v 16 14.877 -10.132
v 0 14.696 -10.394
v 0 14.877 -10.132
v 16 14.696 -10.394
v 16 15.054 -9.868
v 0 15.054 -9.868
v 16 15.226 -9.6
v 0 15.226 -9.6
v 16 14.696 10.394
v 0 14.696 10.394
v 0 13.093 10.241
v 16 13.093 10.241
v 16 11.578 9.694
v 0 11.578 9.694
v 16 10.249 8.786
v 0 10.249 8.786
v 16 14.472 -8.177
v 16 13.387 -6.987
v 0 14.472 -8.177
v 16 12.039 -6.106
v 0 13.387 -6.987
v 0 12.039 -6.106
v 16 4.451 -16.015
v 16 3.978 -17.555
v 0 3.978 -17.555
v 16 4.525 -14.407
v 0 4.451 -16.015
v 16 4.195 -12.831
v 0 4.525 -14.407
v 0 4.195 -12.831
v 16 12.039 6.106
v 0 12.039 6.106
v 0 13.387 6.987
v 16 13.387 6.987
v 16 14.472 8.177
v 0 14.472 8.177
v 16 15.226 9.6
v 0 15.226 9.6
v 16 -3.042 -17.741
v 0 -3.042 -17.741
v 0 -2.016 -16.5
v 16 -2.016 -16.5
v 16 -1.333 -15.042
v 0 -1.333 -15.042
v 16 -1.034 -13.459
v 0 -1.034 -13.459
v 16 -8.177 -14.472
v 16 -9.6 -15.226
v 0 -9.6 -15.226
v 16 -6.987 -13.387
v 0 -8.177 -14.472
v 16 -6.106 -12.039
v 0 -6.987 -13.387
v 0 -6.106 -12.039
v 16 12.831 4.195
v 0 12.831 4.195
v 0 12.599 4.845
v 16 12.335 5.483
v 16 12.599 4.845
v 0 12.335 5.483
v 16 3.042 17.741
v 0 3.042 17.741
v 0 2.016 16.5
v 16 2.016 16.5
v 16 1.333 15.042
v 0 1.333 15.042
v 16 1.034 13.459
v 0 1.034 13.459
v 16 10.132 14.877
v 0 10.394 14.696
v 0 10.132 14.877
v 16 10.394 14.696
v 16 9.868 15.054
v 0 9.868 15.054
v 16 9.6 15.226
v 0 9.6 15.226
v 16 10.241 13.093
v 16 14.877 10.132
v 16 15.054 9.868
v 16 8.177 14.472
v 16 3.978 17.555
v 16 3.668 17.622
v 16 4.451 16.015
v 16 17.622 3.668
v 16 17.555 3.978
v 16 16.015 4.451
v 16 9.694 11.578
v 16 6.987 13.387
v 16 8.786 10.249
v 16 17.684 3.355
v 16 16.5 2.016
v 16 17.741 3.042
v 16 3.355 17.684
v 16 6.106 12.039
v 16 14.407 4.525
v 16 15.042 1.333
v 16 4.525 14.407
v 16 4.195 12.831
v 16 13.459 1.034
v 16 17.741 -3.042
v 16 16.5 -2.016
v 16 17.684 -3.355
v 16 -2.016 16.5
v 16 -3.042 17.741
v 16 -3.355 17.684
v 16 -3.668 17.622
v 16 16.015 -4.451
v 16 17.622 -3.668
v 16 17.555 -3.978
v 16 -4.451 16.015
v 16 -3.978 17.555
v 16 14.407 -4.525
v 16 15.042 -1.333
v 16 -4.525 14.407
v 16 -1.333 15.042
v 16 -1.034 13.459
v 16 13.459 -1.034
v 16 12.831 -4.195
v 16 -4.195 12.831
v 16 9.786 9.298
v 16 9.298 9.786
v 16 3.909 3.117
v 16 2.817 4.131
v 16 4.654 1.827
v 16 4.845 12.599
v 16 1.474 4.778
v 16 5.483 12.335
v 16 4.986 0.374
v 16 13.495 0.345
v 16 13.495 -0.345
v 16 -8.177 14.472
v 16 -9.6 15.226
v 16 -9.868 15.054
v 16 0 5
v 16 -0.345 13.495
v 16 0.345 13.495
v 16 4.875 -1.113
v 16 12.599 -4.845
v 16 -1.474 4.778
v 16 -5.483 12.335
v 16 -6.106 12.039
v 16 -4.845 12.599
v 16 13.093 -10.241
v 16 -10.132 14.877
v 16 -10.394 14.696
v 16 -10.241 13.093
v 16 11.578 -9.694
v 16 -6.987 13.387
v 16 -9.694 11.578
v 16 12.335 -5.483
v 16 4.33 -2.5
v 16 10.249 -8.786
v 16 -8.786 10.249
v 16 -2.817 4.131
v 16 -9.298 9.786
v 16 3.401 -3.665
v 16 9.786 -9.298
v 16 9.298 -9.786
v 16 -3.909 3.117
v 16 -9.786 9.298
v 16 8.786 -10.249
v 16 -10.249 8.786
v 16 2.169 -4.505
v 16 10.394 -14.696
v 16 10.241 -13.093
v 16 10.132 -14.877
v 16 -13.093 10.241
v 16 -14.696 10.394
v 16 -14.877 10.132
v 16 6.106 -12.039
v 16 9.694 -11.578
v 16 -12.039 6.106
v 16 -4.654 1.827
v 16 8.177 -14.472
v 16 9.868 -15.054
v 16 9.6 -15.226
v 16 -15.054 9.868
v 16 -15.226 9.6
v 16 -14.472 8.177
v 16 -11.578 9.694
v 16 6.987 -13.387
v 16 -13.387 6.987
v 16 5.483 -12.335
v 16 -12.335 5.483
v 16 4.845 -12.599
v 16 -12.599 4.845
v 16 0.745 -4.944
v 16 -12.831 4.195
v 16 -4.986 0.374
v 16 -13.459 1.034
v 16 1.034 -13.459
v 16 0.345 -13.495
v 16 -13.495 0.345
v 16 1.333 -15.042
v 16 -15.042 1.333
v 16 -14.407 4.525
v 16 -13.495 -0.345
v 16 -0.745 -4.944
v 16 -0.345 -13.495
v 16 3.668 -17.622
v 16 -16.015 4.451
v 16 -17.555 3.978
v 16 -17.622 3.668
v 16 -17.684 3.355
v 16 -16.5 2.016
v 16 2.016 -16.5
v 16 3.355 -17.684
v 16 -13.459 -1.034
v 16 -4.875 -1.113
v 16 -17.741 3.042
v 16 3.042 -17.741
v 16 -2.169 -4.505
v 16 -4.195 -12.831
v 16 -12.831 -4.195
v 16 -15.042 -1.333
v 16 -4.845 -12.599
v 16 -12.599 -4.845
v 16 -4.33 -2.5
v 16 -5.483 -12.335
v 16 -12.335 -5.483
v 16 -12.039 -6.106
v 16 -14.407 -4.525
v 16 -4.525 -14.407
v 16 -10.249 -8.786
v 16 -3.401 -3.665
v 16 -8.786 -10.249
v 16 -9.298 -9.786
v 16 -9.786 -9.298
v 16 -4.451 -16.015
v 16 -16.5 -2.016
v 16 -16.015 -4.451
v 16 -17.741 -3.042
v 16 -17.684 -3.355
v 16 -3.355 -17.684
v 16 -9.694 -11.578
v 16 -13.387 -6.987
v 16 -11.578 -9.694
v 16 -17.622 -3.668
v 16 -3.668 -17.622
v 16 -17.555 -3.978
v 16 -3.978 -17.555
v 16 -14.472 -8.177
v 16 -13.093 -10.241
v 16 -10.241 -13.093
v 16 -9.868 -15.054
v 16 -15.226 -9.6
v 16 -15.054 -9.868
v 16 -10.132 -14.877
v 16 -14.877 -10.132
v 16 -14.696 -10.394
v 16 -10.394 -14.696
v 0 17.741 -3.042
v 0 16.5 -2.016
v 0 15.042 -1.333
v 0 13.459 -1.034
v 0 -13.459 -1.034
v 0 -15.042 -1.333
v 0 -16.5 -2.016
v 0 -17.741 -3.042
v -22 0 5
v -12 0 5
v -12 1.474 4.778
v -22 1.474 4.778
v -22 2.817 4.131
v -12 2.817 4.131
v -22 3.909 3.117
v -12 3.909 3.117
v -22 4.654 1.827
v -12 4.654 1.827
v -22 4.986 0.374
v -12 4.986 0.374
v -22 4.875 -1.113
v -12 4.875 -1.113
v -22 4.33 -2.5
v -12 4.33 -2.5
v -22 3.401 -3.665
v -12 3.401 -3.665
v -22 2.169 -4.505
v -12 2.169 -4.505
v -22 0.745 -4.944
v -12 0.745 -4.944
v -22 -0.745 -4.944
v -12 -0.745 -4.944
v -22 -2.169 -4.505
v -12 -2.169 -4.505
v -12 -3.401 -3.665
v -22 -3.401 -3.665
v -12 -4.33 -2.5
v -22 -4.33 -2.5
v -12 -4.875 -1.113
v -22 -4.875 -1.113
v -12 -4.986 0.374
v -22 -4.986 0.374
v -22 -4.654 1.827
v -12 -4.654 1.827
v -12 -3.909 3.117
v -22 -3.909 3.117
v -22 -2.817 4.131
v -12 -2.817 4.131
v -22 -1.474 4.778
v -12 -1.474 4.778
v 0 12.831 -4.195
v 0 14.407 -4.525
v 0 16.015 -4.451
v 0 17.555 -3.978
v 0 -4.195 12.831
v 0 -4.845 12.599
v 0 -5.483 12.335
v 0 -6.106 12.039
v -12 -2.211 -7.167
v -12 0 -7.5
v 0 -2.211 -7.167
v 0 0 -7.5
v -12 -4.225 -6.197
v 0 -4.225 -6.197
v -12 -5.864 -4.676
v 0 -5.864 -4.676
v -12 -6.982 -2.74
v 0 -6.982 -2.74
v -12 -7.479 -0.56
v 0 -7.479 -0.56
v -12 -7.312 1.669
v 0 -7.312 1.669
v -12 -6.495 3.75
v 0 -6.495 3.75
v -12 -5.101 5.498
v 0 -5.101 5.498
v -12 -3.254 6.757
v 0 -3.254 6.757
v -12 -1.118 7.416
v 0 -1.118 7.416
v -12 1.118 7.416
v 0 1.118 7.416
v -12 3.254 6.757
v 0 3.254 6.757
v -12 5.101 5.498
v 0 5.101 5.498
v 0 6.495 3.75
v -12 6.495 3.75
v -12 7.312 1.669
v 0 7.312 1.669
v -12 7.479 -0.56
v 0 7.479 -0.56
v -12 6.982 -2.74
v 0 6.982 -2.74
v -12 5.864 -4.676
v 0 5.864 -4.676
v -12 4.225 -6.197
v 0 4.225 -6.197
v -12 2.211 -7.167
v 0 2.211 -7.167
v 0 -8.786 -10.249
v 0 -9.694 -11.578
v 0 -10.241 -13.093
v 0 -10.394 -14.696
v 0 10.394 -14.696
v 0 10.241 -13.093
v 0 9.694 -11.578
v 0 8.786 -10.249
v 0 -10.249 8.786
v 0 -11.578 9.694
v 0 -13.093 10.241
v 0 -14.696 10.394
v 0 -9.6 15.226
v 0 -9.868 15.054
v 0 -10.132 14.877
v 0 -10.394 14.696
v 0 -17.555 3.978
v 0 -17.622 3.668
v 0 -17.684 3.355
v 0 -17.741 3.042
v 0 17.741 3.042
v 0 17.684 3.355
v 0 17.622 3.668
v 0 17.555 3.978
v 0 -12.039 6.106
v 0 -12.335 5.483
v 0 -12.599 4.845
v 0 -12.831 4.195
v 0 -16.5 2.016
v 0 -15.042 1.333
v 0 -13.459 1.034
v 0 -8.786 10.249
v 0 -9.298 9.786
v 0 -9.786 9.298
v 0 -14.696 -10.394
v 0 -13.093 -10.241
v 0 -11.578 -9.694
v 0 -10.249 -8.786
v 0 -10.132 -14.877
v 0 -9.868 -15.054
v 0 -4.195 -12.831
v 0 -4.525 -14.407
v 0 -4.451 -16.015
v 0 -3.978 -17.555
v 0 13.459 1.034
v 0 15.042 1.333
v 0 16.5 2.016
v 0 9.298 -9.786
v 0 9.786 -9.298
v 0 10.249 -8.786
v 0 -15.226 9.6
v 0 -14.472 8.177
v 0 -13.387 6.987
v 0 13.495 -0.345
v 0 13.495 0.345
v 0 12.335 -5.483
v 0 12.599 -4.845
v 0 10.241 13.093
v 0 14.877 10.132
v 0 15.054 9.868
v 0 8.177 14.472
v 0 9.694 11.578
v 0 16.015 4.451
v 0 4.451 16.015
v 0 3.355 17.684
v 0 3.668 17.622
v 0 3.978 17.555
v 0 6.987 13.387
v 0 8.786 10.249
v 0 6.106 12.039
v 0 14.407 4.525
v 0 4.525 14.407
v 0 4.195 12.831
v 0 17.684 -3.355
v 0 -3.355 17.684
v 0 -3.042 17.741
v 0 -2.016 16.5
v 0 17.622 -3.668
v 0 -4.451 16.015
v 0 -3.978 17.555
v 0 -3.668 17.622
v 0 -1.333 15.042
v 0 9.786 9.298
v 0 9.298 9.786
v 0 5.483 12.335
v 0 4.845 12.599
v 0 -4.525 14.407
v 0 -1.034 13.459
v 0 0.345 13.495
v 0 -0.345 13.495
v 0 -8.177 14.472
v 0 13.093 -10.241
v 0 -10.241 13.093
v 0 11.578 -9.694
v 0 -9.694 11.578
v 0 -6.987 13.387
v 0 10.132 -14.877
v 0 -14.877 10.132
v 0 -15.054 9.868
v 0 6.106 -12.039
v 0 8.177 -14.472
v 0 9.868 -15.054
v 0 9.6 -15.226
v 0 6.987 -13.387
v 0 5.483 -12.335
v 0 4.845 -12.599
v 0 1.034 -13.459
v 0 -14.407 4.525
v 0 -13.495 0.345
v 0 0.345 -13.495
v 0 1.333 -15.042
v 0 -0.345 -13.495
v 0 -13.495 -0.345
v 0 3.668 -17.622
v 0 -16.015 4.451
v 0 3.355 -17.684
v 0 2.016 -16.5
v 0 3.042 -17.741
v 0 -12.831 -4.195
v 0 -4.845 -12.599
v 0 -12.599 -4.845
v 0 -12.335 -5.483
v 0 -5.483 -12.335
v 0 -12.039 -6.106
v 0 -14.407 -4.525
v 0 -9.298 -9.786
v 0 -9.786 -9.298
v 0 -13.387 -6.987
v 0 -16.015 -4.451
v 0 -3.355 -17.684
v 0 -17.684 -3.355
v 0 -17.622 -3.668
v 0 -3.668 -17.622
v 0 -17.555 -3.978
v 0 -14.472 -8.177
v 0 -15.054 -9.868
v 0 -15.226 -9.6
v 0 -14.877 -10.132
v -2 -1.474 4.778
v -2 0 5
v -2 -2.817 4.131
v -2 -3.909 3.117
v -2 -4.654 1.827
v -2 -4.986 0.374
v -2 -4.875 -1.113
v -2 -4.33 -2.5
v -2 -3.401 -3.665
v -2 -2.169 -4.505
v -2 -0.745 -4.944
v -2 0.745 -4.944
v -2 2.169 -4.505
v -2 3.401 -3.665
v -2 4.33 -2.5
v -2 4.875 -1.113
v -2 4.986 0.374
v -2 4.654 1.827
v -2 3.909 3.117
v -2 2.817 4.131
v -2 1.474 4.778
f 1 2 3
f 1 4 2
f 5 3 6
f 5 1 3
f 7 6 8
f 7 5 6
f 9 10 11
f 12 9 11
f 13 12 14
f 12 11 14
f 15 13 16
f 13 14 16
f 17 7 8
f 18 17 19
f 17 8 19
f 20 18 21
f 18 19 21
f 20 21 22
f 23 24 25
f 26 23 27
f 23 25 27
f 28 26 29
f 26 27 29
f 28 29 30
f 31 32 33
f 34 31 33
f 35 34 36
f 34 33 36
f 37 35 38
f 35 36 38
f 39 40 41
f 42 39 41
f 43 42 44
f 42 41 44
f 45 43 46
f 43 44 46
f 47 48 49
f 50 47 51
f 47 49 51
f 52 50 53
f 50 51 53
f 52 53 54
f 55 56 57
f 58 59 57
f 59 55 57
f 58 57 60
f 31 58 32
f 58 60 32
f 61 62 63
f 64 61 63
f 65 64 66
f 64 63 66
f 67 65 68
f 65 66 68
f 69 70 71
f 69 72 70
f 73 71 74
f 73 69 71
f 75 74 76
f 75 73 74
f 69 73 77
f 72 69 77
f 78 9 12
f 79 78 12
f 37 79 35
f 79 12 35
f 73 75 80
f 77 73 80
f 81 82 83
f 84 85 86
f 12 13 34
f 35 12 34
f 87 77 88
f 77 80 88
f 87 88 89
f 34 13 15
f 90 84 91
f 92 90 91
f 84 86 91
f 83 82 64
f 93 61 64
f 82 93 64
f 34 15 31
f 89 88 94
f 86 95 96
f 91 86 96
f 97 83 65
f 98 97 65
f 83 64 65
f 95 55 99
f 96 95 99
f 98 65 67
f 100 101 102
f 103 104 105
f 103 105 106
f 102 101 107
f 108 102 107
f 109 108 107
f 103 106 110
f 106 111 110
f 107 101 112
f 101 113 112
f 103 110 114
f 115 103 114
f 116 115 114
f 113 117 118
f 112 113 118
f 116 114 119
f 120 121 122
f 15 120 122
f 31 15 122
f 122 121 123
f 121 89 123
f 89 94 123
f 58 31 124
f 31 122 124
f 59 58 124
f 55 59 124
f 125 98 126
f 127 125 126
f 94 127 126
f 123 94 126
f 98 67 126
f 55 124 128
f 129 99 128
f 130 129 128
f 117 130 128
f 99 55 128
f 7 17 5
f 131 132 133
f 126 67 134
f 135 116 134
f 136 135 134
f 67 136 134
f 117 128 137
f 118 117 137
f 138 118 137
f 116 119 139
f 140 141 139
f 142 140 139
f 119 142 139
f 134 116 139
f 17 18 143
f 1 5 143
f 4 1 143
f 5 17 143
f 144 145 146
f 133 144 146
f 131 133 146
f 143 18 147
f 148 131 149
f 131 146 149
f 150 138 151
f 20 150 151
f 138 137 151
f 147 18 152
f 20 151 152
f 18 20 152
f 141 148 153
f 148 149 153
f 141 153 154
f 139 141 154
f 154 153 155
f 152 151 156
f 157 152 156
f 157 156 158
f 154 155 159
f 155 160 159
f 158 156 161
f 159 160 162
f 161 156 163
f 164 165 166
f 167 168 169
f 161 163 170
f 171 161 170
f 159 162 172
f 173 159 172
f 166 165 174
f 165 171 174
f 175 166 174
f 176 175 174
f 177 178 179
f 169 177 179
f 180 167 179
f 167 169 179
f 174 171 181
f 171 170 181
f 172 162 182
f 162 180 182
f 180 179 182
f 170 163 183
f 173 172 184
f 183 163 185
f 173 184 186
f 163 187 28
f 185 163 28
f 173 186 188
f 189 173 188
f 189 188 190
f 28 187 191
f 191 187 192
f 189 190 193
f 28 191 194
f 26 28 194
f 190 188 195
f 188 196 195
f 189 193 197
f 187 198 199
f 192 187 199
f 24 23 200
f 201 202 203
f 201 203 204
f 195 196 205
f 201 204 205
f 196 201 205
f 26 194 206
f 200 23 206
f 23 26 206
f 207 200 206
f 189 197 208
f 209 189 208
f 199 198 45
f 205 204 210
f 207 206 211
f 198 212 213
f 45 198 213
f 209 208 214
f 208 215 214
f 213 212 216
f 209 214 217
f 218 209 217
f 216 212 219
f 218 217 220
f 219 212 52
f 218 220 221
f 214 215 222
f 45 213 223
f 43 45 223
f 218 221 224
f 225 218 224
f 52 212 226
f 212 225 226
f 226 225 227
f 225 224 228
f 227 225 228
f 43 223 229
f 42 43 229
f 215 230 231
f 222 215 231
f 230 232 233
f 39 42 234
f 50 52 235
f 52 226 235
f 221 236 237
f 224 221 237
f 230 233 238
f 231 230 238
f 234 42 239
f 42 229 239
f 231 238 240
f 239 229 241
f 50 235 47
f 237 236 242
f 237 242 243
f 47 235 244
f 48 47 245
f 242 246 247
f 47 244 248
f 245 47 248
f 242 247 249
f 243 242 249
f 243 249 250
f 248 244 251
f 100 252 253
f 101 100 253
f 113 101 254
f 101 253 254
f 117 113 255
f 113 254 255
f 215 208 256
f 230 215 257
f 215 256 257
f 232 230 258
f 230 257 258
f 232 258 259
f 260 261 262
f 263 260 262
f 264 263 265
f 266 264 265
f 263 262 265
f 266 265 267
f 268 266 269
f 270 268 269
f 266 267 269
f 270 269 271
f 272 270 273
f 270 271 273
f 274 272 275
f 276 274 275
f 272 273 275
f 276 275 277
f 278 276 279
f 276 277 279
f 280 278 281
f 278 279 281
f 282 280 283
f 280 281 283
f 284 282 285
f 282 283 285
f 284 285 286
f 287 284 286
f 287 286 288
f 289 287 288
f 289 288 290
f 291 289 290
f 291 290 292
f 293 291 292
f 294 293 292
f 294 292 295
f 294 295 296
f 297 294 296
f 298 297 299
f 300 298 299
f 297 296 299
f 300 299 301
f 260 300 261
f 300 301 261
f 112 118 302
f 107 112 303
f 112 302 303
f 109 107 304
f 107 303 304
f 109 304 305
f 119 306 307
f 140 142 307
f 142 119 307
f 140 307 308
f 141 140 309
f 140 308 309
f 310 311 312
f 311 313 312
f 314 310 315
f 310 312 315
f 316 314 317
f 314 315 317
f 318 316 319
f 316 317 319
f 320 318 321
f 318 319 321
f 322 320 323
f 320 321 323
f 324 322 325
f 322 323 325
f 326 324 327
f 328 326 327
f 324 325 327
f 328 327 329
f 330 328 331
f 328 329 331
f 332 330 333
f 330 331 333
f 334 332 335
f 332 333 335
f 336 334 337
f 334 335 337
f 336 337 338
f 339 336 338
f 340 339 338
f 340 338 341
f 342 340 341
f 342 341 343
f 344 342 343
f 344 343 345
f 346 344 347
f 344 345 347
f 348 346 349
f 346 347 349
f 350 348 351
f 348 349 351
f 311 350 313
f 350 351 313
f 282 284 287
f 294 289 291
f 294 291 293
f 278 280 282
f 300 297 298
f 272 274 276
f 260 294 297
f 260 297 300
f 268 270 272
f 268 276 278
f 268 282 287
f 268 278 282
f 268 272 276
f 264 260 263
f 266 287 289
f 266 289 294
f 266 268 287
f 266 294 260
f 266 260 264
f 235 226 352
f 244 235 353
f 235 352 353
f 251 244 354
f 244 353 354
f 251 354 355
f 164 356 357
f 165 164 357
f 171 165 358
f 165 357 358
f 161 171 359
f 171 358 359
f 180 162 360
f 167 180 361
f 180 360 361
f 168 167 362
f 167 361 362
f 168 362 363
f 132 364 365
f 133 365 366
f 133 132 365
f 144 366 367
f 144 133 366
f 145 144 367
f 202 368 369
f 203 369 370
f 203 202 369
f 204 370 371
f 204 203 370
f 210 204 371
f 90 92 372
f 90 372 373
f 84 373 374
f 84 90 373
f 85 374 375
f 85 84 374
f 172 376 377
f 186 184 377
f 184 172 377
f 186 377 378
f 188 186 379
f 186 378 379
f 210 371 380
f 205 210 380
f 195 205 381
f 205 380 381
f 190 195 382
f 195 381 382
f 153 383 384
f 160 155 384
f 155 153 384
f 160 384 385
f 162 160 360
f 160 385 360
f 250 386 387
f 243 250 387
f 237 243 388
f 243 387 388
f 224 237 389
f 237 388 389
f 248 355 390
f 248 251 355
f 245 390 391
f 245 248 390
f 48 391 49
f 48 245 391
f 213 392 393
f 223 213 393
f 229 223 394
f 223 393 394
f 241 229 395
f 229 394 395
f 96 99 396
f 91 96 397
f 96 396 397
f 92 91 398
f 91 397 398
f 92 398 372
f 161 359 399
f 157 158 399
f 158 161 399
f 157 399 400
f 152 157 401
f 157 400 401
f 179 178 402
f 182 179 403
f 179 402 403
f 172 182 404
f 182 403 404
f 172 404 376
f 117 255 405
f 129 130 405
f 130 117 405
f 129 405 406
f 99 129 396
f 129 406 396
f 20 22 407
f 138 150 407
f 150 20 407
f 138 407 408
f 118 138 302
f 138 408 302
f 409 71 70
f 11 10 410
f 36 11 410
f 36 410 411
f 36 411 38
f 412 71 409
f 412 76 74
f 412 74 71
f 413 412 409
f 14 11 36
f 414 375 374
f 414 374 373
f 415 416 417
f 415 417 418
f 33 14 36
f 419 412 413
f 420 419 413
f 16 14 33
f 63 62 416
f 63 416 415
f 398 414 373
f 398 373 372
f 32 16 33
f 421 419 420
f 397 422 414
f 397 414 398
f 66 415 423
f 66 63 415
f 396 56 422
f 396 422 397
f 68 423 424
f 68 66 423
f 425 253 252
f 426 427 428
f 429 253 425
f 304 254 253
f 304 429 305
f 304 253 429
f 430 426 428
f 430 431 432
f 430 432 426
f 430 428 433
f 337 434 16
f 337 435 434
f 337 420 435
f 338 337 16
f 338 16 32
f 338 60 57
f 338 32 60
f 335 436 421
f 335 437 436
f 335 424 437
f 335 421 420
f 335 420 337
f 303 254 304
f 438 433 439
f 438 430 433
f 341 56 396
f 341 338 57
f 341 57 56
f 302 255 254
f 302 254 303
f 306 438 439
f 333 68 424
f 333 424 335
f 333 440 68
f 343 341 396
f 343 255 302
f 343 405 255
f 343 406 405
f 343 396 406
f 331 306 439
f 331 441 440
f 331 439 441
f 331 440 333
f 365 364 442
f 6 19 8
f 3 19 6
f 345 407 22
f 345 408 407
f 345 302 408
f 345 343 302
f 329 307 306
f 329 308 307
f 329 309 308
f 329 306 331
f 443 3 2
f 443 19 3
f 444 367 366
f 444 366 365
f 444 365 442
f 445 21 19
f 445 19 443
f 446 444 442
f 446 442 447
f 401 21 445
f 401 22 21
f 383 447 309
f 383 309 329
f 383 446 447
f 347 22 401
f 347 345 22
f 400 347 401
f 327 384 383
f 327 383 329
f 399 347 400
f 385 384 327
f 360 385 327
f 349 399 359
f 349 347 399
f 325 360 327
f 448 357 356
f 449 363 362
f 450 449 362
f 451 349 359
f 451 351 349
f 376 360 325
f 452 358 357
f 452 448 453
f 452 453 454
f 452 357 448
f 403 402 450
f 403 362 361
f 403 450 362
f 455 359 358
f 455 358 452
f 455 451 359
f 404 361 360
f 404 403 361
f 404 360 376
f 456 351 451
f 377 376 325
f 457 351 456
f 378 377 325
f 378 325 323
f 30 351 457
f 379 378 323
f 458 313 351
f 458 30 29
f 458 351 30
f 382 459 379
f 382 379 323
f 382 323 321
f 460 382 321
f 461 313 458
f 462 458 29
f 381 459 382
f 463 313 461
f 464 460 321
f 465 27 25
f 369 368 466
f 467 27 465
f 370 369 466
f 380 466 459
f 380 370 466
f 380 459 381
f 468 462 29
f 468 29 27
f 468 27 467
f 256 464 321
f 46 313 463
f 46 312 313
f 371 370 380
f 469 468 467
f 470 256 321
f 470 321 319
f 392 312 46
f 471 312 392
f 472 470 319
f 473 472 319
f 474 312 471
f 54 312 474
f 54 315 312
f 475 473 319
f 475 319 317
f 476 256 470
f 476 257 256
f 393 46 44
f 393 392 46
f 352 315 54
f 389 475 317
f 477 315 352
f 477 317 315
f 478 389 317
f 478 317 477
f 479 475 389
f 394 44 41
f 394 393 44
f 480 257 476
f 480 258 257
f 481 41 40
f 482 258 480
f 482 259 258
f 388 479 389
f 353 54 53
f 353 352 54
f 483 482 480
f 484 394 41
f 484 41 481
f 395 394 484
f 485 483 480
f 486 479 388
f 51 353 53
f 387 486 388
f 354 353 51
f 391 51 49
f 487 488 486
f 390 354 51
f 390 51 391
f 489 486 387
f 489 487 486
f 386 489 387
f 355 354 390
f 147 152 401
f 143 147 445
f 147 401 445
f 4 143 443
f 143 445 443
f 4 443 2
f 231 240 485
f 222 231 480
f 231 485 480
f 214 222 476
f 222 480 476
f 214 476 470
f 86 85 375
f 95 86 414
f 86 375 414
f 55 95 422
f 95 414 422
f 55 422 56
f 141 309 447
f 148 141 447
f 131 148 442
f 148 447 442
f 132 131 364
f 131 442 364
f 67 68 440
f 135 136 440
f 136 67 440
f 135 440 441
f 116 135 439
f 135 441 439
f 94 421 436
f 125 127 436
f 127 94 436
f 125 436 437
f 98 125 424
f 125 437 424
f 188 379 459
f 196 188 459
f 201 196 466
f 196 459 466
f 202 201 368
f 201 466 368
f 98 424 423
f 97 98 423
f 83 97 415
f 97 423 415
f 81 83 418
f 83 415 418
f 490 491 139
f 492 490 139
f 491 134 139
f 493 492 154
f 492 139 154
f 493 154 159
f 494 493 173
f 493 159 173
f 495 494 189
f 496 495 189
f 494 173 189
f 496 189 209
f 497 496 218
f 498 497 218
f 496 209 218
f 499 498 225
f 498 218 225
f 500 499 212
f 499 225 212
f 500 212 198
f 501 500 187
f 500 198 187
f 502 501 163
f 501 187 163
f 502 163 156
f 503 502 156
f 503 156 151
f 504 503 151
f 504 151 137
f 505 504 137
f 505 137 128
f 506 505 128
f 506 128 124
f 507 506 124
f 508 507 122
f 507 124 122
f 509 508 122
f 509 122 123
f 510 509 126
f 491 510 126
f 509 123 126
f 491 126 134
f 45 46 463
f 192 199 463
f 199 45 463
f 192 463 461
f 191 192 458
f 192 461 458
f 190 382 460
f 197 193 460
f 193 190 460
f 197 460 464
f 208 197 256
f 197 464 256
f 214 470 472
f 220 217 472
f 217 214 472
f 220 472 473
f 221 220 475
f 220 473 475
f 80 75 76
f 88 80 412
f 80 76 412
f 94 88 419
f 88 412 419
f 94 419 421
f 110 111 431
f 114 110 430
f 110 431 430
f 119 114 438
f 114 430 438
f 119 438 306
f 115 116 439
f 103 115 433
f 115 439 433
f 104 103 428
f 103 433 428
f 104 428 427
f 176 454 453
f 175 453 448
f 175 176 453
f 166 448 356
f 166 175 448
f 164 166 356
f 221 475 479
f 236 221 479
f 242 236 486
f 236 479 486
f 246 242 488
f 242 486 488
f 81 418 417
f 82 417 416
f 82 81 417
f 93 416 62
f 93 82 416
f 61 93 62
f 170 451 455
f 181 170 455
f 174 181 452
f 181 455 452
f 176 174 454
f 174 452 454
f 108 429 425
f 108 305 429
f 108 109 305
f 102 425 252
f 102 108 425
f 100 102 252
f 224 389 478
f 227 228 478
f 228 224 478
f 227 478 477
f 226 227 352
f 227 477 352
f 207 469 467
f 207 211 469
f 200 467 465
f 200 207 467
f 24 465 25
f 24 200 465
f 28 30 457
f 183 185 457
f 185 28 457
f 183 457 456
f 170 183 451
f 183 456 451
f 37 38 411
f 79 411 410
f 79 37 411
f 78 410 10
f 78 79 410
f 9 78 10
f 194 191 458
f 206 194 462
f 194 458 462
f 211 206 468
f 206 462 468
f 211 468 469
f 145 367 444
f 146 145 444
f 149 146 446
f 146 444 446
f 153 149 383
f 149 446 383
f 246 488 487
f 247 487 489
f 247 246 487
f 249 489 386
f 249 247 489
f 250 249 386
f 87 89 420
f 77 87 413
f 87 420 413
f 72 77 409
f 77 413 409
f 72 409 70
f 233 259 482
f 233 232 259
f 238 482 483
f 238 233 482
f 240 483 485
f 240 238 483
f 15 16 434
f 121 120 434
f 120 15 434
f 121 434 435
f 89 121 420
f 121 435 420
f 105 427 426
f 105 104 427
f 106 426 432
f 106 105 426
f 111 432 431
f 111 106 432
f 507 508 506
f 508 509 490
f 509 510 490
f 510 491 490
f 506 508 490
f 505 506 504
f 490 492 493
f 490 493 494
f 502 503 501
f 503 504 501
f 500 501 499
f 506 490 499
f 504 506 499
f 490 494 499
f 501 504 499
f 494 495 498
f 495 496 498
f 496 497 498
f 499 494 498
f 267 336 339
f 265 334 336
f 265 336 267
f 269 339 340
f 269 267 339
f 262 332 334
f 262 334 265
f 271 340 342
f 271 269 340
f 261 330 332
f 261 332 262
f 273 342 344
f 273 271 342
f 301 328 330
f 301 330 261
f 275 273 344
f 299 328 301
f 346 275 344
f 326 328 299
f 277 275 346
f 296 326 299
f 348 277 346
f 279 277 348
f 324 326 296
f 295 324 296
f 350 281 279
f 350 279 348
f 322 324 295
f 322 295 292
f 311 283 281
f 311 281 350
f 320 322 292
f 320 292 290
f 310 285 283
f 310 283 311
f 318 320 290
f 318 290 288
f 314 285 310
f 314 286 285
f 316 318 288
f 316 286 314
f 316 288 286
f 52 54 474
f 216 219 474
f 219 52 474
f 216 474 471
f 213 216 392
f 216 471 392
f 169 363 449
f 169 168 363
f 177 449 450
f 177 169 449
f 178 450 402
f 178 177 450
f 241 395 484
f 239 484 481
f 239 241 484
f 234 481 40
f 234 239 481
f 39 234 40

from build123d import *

# Parameters (mm, degrees)
BASPROSKE_W         = 16
BASPROSKE_H         = 18
TOOTHCUT_DEPTH      = 31.066592757
TEETHCUTS_COUNT     = 16
TEETHCUTS_ANGLE     = 337.5
HUBNEAONESKE_R      = 7.5
HUBNEARONE_DEPTH    = 22.0000508
BORSKE_R            = 5
BORE_DEPTH          = 38.0000508
CUT_EXTRUDE1_START  = -10
SKETCH3_R           = 7.5
CUT_EXTRUDE1_DEPTH  = 10
BOSS_EXTRUDE1_START = -10
SKETCH4_R           = 7.5
BOSS_EXTRUDE1_DEPTH = 10
SKETCH5_R           = 5
BOSS_EXTRUDE2_DEPTH = 10


with BuildPart() as part:
    # BasProSke → Base-Revolve (revolve)
    with BuildSketch(Plane(origin=(0, 0, 0), x_dir=(1, 0, 0), z_dir=(0, 1, 0)), mode=Mode.PRIVATE) as base_revolve_sk:
        with Locations((8, 9)):
            Rectangle(BASPROSKE_W, BASPROSKE_H)
    revolve(base_revolve_sk.sketch.rotate(Axis((-10, 0, 0), (1, 0, 0)), 180), axis=Axis((-10, 0, 0), (1, 0, 0)))

    # TooCutSke → ToothCut (cut, through all)
    with BuildSketch(Plane(origin=(0, 0, 0), x_dir=(0, 0, -1), z_dir=(1, 0, 0))):
        with BuildLine():
            ThreePointArc((1.03434411, 13.459313997), (0, 13.499), (-1.03434411, 13.459313997))
            ThreePointArc((-1.03434411, 13.459313997), (-1.635143665, 15.806872195), (-3.065655864, 17.762792553))
            ThreePointArc((-3.065655864, 17.762792553), (0, 18.0254), (3.065655864, 17.762792553))
            ThreePointArc((3.065655864, 17.762792553), (1.635143665, 15.806872195), (1.03434411, 13.459313997))
        make_face()
    toothcut = extrude(amount=TOOTHCUT_DEPTH, mode=Mode.SUBTRACT)

    # TeethCuts: ToothCut ×16 about axis
    teethcuts_axis = Axis((-10, 0, 0), (1, 0, 0))
    for i in range(1, TEETHCUTS_COUNT):
        add(toothcut.rotate(teethcuts_axis, i * TEETHCUTS_ANGLE / (TEETHCUTS_COUNT - 1)), mode=Mode.SUBTRACT)

    # HubNeaOneSke → HubNearOne (add)
    with BuildSketch(Plane.ZY):
        with Locations(Location((0, 0, 0), (0, 0, 180))):
            Circle(HUBNEAONESKE_R)
    extrude(amount=HUBNEARONE_DEPTH)

    # BorSke → Bore (cut, symmetric)
    with BuildSketch(Plane(origin=(0, 0, 0), x_dir=(0, 0, -1), z_dir=(1, 0, 0))):
        with Locations(Location((0, 0, 0), (0, 0, 180))):
            Circle(BORSKE_R)
    extrude(amount=BORE_DEPTH, both=True, mode=Mode.SUBTRACT)

    # Sketch3 → Cut-Extrude1 (cut)
    with BuildSketch(Plane.ZY.offset(22.0000508).offset(CUT_EXTRUDE1_START)):
        with Locations(Location((0, 0, 0), (0, 0, 180))):
            Circle(SKETCH3_R)
    extrude(amount=CUT_EXTRUDE1_DEPTH, mode=Mode.SUBTRACT)

    # Sketch4 → Boss-Extrude1 (add)
    with BuildSketch(Plane.ZY.offset(12.0000508).offset(BOSS_EXTRUDE1_START)):
        with Locations(Location((0, 0, 0), (0, 0, 180))):
            Circle(SKETCH4_R)
    extrude(amount=BOSS_EXTRUDE1_DEPTH)

    # Sketch5 → Boss-Extrude2 (add)
    with BuildSketch(Plane.ZY.offset(12.0000508)):
        Circle(SKETCH5_R)
    extrude(amount=BOSS_EXTRUDE2_DEPTH)


solid = part.part
